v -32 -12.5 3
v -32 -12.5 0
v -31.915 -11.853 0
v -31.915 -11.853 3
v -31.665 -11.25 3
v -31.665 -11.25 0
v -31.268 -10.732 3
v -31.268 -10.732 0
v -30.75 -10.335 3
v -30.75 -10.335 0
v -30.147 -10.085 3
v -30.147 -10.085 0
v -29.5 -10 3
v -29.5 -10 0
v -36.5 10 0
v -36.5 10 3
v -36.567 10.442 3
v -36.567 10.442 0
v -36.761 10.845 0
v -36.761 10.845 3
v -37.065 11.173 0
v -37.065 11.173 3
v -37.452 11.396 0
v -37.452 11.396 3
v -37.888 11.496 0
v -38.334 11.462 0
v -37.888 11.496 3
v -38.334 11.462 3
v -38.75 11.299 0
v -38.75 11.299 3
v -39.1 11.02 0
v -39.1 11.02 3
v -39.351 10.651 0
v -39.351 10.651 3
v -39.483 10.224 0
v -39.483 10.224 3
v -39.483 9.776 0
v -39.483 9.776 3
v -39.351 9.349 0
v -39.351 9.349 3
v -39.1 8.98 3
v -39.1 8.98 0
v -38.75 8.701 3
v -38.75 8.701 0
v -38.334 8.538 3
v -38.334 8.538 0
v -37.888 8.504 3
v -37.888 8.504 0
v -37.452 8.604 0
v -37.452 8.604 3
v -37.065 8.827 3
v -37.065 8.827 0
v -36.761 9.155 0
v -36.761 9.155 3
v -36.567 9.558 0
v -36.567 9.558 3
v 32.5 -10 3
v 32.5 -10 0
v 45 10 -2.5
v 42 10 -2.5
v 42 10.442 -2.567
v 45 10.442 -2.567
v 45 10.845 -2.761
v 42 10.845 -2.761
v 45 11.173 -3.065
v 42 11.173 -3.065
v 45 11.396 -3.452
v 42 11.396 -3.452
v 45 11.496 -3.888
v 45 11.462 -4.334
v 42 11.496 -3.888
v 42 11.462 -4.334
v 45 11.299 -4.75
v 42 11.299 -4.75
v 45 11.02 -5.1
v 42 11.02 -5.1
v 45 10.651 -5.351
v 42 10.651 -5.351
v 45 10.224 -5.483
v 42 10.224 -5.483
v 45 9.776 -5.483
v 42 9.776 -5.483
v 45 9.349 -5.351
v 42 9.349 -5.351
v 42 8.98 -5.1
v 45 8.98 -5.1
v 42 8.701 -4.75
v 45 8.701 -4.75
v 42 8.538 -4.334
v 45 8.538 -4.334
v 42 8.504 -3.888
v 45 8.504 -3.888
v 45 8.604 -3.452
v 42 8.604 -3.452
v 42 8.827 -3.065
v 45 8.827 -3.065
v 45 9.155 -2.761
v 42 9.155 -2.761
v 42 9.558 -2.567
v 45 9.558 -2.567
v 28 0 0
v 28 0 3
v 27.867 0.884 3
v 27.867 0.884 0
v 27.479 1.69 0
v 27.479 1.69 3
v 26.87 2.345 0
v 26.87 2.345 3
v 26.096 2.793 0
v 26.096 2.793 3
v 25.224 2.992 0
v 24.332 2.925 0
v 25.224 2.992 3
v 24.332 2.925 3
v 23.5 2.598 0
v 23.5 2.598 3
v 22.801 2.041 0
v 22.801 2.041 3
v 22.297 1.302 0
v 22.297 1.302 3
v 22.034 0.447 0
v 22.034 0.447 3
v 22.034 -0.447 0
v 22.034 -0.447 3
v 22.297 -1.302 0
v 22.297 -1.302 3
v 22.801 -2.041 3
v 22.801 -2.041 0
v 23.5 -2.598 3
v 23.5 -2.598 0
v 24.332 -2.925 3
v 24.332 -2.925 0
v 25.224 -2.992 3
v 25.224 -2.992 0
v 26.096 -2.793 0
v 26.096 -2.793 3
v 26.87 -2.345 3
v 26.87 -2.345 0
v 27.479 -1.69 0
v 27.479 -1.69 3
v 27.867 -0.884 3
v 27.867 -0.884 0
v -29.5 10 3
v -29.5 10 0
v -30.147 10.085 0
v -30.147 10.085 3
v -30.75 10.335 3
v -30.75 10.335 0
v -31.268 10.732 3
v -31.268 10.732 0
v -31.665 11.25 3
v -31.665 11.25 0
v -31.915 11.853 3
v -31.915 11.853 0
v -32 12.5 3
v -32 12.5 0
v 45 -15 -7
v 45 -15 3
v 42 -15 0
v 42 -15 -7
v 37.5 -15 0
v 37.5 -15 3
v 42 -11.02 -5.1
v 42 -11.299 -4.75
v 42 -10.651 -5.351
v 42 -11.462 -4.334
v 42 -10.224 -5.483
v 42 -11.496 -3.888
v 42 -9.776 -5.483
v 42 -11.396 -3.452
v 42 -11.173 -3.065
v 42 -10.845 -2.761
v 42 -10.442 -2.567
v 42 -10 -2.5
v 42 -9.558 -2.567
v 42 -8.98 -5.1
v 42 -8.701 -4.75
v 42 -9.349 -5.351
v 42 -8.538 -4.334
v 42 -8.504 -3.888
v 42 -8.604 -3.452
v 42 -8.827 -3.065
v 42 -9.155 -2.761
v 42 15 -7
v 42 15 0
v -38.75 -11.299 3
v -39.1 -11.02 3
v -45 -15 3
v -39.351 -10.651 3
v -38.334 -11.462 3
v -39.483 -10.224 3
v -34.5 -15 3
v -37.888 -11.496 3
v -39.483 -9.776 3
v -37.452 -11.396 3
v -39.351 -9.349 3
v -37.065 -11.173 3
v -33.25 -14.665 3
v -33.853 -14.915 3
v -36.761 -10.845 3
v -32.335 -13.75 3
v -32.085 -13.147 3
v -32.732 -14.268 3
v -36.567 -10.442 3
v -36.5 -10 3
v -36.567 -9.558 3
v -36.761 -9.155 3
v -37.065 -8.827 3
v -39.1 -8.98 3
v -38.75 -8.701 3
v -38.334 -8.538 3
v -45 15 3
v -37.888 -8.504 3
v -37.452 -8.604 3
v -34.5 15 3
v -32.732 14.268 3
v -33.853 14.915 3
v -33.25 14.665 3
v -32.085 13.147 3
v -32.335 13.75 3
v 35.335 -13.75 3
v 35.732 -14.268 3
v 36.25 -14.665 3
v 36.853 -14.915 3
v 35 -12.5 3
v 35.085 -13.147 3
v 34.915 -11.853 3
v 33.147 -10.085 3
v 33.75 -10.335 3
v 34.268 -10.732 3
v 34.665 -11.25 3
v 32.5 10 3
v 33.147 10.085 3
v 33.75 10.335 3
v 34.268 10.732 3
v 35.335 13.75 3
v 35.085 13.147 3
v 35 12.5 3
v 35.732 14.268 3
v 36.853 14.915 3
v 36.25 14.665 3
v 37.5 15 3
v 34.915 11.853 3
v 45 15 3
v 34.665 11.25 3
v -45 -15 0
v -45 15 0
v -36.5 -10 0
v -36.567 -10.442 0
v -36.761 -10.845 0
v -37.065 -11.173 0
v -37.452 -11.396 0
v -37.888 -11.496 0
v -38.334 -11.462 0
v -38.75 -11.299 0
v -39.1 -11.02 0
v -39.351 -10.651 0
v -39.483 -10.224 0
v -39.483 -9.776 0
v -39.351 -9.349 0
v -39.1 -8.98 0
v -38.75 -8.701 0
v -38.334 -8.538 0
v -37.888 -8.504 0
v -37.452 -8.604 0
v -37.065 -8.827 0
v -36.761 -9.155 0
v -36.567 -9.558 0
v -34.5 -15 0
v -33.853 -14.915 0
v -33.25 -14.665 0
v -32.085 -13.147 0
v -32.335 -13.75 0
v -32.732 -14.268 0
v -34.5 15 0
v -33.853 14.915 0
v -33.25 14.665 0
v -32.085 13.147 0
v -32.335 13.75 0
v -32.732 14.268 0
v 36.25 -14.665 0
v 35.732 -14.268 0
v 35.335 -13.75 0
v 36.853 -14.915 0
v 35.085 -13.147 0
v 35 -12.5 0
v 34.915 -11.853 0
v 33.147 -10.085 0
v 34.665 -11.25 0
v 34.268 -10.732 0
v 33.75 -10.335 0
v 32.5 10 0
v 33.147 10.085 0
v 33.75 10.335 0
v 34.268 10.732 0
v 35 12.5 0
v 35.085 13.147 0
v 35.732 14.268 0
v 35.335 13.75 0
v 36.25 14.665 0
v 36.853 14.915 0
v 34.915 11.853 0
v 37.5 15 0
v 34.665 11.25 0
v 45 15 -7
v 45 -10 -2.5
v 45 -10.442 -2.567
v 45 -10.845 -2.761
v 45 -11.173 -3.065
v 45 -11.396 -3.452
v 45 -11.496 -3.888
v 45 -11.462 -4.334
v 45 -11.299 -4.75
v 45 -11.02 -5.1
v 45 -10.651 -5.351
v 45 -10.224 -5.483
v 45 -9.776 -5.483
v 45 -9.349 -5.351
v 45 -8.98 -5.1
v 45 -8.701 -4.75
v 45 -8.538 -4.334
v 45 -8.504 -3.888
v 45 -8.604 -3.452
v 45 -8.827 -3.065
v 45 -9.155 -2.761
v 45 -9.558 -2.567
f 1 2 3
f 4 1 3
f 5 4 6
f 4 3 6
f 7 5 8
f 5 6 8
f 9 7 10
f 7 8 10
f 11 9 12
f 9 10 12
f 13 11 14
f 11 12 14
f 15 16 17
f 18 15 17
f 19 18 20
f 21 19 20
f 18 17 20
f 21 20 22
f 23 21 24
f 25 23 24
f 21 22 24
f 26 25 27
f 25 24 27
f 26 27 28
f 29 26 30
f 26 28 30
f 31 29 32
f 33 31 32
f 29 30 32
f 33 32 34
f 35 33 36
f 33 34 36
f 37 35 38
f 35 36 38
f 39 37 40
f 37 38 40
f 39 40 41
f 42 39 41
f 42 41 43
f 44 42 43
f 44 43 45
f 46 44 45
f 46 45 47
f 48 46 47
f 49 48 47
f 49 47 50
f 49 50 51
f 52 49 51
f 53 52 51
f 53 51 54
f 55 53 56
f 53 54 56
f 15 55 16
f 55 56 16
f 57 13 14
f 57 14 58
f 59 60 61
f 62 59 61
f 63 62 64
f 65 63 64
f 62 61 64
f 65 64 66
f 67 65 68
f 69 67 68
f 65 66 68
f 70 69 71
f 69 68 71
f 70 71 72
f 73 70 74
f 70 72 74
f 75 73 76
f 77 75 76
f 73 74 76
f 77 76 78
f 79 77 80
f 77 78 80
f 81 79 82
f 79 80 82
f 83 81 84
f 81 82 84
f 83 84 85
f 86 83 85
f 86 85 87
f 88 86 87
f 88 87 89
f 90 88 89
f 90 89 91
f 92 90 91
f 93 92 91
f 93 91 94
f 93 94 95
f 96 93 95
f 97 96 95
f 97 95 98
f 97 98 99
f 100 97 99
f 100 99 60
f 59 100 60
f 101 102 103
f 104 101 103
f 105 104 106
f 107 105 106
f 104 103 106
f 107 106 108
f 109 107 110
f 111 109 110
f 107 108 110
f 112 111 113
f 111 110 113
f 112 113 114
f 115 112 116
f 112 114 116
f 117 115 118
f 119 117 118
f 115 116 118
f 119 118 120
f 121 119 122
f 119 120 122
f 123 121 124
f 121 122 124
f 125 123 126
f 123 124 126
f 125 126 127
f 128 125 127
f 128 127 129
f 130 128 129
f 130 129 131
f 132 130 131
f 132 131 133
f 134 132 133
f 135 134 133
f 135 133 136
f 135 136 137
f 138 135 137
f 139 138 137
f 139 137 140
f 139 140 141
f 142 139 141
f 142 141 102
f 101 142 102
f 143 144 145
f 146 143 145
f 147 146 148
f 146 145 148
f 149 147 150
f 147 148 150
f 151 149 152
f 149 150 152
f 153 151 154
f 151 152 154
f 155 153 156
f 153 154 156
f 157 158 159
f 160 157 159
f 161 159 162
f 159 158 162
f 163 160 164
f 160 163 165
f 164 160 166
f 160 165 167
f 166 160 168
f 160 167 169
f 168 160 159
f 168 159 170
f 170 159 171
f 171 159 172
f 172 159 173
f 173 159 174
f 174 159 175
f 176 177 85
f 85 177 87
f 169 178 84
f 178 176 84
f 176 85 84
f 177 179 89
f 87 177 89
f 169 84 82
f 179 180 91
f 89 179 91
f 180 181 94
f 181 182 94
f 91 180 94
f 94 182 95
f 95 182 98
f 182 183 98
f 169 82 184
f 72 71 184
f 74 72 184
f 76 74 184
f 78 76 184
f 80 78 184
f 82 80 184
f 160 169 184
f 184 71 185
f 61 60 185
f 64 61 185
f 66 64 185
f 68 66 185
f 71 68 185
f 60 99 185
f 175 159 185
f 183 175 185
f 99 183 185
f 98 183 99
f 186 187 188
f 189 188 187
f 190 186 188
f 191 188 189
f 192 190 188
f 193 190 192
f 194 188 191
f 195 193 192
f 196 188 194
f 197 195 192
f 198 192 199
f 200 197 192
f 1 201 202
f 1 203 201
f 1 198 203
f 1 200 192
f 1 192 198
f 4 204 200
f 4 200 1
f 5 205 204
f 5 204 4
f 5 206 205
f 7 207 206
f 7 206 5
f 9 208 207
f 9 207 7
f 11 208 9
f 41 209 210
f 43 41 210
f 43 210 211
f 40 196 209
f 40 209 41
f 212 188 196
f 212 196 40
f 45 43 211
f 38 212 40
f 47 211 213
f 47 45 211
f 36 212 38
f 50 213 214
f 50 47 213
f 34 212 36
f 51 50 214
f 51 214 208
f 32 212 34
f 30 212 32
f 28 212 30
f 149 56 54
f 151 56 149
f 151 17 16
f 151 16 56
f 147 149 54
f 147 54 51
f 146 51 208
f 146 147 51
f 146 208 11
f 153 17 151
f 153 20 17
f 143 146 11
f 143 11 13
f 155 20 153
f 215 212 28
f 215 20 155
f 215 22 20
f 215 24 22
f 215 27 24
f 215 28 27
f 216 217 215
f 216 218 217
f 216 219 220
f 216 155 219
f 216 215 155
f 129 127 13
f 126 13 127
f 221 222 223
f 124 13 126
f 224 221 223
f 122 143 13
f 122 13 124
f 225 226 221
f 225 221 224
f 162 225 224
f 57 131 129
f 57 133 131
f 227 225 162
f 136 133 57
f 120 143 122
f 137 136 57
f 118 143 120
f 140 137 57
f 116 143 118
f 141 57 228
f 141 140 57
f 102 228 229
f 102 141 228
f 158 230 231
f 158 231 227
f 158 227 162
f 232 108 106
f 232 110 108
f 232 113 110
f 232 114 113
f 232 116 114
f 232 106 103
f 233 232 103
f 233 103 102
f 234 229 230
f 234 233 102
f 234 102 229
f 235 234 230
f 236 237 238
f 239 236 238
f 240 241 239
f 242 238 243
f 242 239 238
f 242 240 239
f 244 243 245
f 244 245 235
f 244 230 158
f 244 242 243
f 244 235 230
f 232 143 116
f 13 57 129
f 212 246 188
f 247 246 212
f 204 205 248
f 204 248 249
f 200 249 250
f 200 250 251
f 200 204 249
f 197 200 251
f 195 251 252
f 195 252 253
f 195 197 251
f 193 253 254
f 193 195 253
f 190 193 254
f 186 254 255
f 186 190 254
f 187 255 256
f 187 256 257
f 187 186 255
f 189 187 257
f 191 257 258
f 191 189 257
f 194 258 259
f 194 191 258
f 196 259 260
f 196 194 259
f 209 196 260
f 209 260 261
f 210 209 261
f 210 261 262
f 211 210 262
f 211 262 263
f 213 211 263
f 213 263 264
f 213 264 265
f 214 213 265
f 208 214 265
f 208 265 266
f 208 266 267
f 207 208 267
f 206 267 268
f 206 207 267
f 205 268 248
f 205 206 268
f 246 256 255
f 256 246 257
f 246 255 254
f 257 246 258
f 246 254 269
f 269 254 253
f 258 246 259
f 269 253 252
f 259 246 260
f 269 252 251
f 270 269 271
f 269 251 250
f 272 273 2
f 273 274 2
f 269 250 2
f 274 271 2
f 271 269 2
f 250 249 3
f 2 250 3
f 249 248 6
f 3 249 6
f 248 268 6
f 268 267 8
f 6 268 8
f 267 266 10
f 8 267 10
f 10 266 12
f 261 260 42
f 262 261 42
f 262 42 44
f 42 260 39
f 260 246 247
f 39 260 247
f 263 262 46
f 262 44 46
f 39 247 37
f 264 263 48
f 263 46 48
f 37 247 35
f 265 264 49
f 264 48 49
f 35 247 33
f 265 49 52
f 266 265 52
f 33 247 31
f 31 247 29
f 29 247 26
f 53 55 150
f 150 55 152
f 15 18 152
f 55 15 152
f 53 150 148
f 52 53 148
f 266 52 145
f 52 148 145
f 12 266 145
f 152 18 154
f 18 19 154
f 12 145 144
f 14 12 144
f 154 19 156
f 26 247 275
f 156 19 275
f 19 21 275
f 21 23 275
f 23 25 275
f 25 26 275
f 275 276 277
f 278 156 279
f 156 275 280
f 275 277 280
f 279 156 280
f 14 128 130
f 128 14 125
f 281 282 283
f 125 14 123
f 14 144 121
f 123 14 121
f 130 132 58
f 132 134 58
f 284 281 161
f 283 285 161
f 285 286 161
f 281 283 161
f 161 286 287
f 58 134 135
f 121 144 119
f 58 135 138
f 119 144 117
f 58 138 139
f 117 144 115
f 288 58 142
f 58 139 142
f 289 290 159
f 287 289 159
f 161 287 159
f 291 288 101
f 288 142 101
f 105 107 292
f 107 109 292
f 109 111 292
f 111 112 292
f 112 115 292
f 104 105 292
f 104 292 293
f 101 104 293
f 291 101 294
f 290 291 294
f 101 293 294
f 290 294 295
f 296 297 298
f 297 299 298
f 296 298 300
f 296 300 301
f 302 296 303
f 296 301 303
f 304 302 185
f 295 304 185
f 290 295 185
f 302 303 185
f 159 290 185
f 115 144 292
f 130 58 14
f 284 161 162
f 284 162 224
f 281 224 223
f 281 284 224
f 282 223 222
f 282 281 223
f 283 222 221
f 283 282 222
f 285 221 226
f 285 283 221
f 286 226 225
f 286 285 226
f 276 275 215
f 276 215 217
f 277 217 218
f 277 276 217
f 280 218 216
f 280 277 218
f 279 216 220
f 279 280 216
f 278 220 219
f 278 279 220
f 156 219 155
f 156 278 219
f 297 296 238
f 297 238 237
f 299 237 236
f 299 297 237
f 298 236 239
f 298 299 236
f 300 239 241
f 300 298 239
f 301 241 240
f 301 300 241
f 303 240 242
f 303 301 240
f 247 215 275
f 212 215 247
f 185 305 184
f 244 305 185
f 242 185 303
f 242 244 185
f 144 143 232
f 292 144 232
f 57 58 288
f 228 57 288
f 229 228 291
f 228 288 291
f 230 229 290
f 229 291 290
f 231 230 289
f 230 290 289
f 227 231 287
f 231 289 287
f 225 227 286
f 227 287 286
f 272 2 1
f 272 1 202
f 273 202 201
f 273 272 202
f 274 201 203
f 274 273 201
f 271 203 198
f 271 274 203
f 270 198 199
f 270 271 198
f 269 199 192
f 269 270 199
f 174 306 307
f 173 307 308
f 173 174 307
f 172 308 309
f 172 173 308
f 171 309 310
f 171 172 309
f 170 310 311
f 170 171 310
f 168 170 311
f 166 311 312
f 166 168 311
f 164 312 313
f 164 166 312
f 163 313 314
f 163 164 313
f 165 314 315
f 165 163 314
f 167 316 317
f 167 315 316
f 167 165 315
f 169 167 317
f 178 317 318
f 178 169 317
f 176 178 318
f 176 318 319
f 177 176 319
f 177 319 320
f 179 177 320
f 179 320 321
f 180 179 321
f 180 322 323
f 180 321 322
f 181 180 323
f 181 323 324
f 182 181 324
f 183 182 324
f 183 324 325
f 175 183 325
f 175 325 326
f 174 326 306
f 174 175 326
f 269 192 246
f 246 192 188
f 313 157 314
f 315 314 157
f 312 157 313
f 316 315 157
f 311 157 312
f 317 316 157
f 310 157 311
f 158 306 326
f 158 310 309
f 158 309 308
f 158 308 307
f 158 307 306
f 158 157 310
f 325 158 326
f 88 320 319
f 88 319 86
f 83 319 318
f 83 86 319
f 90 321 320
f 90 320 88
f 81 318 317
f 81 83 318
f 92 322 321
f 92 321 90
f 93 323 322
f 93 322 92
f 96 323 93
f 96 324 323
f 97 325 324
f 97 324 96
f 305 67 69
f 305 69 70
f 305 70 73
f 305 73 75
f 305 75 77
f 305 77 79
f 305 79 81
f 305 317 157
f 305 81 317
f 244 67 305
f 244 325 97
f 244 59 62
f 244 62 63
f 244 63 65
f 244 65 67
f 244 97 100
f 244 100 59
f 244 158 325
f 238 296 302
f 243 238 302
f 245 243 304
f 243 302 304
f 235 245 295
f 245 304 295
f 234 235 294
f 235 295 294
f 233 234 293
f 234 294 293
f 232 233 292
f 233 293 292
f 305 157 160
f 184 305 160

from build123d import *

# Parameters (mm, degrees)
SKETCH1_W           = 90
SKETCH1_H           = 30
BOSS_EXTRUDE1_DEPTH = 3
SKETCH2_R           = 1.5
CUT_EXTRUDE1_DEPTH  = 3
SKETCH3_W           = 3
SKETCH3_H           = 30
BOSS_EXTRUDE2_DEPTH = 7
SKETCH4_R           = 1.5
CUT_EXTRUDE2_DEPTH  = 7
SKETCH5_W           = 67
SKETCH5_H           = 5
CUT_EXTRUDE3_DEPTH  = 7
FILLET1_START       = -7
FILLET1_DEPTH       = 11
FILLET1_2_DEPTH     = 3
SKETCH6_R           = 3
CUT_EXTRUDE4_DEPTH  = 10


with BuildPart() as part:
    # Sketch1 → Boss-Extrude1 (new body)
    with BuildSketch(Plane.XY):
        Rectangle(SKETCH1_W, SKETCH1_H)
    extrude(amount=BOSS_EXTRUDE1_DEPTH)

    # Sketch2 → Cut-Extrude1 (cut)
    with BuildSketch(Plane.XY.offset(3)):
        with Locations((-38, 10)):
            Circle(SKETCH2_R)
    cut_extrude1 = extrude(amount=-CUT_EXTRUDE1_DEPTH, mode=Mode.SUBTRACT)

    # Sketch3 → Boss-Extrude2 (add)
    with BuildSketch(Plane(origin=(0, 0, 0), x_dir=(-1, 0, 0), z_dir=(0, 0, -1))):
        with Locations((-43.5, 0)):
            Rectangle(SKETCH3_W, SKETCH3_H)
    extrude(amount=BOSS_EXTRUDE2_DEPTH)

    # Sketch4 → Cut-Extrude2 (cut)
    with BuildSketch(Plane.ZY.offset(-42)):
        with Locations((-4, 10)):
            Circle(SKETCH4_R)
    cut_extrude2 = extrude(amount=-CUT_EXTRUDE2_DEPTH, mode=Mode.SUBTRACT)

    # Sketch5 → Cut-Extrude3 (cut)
    with BuildSketch(Plane.XY.offset(3)):
        with Locations((1.5, 12.5)):
            Rectangle(SKETCH5_W, SKETCH5_H)
    cut_extrude3 = extrude(amount=-CUT_EXTRUDE3_DEPTH, mode=Mode.SUBTRACT)

    # Mirror1: Cut-Extrude1, Cut-Extrude2, Cut-Extrude3 across plane
    add(cut_extrude1.mirror(Plane.ZX), mode=Mode.SUBTRACT)
    add(cut_extrude2.mirror(Plane.ZX), mode=Mode.SUBTRACT)
    add(cut_extrude3.mirror(Plane.ZX), mode=Mode.SUBTRACT)

    # Fillet1: read off the stored shape, not the designer's step
    # Fillet1 outline → Fillet1 (cut)
    with BuildSketch(Plane.XY.offset(FILLET1_START)):
        with BuildLine():
            Line((-32, -15), (-32, -12.5))
            ThreePointArc((-32, -12.5), (-32.732233047, -14.267766953), (-34.5, -15))
            Line((-34.5, -15), (-32, -15))
        make_face()
        with BuildLine():
            ThreePointArc((37.5, -15), (35.732233047, -14.267766953), (35, -12.5))
            Line((35, -12.5), (35, -15))
            Line((35, -15), (37.5, -15))
        make_face()
        with BuildLine():
            ThreePointArc((-34.5, 15), (-32.732233047, 14.267766953), (-32, 12.5))
            Line((-32, 12.5), (-32, 15))
            Line((-32, 15), (-34.5, 15))
        make_face()
        with BuildLine():
            ThreePointArc((35, 12.5), (35.732233047, 14.267766953), (37.5, 15))
            Line((37.5, 15), (35, 15))
            Line((35, 15), (35, 12.5))
        make_face()
    extrude(amount=FILLET1_DEPTH, mode=Mode.SUBTRACT)

    # Fillet1 2 outline → Fillet1 2 (add)
    with BuildSketch(Plane.XY):
        with BuildLine():
            Line((35, -10), (32.5, -10))
            ThreePointArc((32.5, -10), (34.267766953, -10.732233047), (35, -12.5))
            Line((35, -12.5), (35, -10))
        make_face()
        with BuildLine():
            ThreePointArc((-32, -12.5), (-31.267766953, -10.732233047), (-29.5, -10))
            Line((-29.5, -10), (-32, -10))
            Line((-32, -10), (-32, -12.5))
        make_face()
        with BuildLine():
            Line((-32, 10), (-29.5, 10))
            ThreePointArc((-29.5, 10), (-31.267766953, 10.732233047), (-32, 12.5))
            Line((-32, 12.5), (-32, 10))
        make_face()
        with BuildLine():
            Line((35, 10), (35, 12.5))
            ThreePointArc((35, 12.5), (34.267766953, 10.732233047), (32.5, 10))
            Line((32.5, 10), (35, 10))
        make_face()
    extrude(amount=FILLET1_2_DEPTH)

    # Sketch6 → Cut-Extrude4 (cut)
    with BuildSketch(Plane.XY.offset(3)):
        with Locations((25, 0)):
            Circle(SKETCH6_R)
    extrude(amount=-CUT_EXTRUDE4_DEPTH, mode=Mode.SUBTRACT)


solid = part.part
